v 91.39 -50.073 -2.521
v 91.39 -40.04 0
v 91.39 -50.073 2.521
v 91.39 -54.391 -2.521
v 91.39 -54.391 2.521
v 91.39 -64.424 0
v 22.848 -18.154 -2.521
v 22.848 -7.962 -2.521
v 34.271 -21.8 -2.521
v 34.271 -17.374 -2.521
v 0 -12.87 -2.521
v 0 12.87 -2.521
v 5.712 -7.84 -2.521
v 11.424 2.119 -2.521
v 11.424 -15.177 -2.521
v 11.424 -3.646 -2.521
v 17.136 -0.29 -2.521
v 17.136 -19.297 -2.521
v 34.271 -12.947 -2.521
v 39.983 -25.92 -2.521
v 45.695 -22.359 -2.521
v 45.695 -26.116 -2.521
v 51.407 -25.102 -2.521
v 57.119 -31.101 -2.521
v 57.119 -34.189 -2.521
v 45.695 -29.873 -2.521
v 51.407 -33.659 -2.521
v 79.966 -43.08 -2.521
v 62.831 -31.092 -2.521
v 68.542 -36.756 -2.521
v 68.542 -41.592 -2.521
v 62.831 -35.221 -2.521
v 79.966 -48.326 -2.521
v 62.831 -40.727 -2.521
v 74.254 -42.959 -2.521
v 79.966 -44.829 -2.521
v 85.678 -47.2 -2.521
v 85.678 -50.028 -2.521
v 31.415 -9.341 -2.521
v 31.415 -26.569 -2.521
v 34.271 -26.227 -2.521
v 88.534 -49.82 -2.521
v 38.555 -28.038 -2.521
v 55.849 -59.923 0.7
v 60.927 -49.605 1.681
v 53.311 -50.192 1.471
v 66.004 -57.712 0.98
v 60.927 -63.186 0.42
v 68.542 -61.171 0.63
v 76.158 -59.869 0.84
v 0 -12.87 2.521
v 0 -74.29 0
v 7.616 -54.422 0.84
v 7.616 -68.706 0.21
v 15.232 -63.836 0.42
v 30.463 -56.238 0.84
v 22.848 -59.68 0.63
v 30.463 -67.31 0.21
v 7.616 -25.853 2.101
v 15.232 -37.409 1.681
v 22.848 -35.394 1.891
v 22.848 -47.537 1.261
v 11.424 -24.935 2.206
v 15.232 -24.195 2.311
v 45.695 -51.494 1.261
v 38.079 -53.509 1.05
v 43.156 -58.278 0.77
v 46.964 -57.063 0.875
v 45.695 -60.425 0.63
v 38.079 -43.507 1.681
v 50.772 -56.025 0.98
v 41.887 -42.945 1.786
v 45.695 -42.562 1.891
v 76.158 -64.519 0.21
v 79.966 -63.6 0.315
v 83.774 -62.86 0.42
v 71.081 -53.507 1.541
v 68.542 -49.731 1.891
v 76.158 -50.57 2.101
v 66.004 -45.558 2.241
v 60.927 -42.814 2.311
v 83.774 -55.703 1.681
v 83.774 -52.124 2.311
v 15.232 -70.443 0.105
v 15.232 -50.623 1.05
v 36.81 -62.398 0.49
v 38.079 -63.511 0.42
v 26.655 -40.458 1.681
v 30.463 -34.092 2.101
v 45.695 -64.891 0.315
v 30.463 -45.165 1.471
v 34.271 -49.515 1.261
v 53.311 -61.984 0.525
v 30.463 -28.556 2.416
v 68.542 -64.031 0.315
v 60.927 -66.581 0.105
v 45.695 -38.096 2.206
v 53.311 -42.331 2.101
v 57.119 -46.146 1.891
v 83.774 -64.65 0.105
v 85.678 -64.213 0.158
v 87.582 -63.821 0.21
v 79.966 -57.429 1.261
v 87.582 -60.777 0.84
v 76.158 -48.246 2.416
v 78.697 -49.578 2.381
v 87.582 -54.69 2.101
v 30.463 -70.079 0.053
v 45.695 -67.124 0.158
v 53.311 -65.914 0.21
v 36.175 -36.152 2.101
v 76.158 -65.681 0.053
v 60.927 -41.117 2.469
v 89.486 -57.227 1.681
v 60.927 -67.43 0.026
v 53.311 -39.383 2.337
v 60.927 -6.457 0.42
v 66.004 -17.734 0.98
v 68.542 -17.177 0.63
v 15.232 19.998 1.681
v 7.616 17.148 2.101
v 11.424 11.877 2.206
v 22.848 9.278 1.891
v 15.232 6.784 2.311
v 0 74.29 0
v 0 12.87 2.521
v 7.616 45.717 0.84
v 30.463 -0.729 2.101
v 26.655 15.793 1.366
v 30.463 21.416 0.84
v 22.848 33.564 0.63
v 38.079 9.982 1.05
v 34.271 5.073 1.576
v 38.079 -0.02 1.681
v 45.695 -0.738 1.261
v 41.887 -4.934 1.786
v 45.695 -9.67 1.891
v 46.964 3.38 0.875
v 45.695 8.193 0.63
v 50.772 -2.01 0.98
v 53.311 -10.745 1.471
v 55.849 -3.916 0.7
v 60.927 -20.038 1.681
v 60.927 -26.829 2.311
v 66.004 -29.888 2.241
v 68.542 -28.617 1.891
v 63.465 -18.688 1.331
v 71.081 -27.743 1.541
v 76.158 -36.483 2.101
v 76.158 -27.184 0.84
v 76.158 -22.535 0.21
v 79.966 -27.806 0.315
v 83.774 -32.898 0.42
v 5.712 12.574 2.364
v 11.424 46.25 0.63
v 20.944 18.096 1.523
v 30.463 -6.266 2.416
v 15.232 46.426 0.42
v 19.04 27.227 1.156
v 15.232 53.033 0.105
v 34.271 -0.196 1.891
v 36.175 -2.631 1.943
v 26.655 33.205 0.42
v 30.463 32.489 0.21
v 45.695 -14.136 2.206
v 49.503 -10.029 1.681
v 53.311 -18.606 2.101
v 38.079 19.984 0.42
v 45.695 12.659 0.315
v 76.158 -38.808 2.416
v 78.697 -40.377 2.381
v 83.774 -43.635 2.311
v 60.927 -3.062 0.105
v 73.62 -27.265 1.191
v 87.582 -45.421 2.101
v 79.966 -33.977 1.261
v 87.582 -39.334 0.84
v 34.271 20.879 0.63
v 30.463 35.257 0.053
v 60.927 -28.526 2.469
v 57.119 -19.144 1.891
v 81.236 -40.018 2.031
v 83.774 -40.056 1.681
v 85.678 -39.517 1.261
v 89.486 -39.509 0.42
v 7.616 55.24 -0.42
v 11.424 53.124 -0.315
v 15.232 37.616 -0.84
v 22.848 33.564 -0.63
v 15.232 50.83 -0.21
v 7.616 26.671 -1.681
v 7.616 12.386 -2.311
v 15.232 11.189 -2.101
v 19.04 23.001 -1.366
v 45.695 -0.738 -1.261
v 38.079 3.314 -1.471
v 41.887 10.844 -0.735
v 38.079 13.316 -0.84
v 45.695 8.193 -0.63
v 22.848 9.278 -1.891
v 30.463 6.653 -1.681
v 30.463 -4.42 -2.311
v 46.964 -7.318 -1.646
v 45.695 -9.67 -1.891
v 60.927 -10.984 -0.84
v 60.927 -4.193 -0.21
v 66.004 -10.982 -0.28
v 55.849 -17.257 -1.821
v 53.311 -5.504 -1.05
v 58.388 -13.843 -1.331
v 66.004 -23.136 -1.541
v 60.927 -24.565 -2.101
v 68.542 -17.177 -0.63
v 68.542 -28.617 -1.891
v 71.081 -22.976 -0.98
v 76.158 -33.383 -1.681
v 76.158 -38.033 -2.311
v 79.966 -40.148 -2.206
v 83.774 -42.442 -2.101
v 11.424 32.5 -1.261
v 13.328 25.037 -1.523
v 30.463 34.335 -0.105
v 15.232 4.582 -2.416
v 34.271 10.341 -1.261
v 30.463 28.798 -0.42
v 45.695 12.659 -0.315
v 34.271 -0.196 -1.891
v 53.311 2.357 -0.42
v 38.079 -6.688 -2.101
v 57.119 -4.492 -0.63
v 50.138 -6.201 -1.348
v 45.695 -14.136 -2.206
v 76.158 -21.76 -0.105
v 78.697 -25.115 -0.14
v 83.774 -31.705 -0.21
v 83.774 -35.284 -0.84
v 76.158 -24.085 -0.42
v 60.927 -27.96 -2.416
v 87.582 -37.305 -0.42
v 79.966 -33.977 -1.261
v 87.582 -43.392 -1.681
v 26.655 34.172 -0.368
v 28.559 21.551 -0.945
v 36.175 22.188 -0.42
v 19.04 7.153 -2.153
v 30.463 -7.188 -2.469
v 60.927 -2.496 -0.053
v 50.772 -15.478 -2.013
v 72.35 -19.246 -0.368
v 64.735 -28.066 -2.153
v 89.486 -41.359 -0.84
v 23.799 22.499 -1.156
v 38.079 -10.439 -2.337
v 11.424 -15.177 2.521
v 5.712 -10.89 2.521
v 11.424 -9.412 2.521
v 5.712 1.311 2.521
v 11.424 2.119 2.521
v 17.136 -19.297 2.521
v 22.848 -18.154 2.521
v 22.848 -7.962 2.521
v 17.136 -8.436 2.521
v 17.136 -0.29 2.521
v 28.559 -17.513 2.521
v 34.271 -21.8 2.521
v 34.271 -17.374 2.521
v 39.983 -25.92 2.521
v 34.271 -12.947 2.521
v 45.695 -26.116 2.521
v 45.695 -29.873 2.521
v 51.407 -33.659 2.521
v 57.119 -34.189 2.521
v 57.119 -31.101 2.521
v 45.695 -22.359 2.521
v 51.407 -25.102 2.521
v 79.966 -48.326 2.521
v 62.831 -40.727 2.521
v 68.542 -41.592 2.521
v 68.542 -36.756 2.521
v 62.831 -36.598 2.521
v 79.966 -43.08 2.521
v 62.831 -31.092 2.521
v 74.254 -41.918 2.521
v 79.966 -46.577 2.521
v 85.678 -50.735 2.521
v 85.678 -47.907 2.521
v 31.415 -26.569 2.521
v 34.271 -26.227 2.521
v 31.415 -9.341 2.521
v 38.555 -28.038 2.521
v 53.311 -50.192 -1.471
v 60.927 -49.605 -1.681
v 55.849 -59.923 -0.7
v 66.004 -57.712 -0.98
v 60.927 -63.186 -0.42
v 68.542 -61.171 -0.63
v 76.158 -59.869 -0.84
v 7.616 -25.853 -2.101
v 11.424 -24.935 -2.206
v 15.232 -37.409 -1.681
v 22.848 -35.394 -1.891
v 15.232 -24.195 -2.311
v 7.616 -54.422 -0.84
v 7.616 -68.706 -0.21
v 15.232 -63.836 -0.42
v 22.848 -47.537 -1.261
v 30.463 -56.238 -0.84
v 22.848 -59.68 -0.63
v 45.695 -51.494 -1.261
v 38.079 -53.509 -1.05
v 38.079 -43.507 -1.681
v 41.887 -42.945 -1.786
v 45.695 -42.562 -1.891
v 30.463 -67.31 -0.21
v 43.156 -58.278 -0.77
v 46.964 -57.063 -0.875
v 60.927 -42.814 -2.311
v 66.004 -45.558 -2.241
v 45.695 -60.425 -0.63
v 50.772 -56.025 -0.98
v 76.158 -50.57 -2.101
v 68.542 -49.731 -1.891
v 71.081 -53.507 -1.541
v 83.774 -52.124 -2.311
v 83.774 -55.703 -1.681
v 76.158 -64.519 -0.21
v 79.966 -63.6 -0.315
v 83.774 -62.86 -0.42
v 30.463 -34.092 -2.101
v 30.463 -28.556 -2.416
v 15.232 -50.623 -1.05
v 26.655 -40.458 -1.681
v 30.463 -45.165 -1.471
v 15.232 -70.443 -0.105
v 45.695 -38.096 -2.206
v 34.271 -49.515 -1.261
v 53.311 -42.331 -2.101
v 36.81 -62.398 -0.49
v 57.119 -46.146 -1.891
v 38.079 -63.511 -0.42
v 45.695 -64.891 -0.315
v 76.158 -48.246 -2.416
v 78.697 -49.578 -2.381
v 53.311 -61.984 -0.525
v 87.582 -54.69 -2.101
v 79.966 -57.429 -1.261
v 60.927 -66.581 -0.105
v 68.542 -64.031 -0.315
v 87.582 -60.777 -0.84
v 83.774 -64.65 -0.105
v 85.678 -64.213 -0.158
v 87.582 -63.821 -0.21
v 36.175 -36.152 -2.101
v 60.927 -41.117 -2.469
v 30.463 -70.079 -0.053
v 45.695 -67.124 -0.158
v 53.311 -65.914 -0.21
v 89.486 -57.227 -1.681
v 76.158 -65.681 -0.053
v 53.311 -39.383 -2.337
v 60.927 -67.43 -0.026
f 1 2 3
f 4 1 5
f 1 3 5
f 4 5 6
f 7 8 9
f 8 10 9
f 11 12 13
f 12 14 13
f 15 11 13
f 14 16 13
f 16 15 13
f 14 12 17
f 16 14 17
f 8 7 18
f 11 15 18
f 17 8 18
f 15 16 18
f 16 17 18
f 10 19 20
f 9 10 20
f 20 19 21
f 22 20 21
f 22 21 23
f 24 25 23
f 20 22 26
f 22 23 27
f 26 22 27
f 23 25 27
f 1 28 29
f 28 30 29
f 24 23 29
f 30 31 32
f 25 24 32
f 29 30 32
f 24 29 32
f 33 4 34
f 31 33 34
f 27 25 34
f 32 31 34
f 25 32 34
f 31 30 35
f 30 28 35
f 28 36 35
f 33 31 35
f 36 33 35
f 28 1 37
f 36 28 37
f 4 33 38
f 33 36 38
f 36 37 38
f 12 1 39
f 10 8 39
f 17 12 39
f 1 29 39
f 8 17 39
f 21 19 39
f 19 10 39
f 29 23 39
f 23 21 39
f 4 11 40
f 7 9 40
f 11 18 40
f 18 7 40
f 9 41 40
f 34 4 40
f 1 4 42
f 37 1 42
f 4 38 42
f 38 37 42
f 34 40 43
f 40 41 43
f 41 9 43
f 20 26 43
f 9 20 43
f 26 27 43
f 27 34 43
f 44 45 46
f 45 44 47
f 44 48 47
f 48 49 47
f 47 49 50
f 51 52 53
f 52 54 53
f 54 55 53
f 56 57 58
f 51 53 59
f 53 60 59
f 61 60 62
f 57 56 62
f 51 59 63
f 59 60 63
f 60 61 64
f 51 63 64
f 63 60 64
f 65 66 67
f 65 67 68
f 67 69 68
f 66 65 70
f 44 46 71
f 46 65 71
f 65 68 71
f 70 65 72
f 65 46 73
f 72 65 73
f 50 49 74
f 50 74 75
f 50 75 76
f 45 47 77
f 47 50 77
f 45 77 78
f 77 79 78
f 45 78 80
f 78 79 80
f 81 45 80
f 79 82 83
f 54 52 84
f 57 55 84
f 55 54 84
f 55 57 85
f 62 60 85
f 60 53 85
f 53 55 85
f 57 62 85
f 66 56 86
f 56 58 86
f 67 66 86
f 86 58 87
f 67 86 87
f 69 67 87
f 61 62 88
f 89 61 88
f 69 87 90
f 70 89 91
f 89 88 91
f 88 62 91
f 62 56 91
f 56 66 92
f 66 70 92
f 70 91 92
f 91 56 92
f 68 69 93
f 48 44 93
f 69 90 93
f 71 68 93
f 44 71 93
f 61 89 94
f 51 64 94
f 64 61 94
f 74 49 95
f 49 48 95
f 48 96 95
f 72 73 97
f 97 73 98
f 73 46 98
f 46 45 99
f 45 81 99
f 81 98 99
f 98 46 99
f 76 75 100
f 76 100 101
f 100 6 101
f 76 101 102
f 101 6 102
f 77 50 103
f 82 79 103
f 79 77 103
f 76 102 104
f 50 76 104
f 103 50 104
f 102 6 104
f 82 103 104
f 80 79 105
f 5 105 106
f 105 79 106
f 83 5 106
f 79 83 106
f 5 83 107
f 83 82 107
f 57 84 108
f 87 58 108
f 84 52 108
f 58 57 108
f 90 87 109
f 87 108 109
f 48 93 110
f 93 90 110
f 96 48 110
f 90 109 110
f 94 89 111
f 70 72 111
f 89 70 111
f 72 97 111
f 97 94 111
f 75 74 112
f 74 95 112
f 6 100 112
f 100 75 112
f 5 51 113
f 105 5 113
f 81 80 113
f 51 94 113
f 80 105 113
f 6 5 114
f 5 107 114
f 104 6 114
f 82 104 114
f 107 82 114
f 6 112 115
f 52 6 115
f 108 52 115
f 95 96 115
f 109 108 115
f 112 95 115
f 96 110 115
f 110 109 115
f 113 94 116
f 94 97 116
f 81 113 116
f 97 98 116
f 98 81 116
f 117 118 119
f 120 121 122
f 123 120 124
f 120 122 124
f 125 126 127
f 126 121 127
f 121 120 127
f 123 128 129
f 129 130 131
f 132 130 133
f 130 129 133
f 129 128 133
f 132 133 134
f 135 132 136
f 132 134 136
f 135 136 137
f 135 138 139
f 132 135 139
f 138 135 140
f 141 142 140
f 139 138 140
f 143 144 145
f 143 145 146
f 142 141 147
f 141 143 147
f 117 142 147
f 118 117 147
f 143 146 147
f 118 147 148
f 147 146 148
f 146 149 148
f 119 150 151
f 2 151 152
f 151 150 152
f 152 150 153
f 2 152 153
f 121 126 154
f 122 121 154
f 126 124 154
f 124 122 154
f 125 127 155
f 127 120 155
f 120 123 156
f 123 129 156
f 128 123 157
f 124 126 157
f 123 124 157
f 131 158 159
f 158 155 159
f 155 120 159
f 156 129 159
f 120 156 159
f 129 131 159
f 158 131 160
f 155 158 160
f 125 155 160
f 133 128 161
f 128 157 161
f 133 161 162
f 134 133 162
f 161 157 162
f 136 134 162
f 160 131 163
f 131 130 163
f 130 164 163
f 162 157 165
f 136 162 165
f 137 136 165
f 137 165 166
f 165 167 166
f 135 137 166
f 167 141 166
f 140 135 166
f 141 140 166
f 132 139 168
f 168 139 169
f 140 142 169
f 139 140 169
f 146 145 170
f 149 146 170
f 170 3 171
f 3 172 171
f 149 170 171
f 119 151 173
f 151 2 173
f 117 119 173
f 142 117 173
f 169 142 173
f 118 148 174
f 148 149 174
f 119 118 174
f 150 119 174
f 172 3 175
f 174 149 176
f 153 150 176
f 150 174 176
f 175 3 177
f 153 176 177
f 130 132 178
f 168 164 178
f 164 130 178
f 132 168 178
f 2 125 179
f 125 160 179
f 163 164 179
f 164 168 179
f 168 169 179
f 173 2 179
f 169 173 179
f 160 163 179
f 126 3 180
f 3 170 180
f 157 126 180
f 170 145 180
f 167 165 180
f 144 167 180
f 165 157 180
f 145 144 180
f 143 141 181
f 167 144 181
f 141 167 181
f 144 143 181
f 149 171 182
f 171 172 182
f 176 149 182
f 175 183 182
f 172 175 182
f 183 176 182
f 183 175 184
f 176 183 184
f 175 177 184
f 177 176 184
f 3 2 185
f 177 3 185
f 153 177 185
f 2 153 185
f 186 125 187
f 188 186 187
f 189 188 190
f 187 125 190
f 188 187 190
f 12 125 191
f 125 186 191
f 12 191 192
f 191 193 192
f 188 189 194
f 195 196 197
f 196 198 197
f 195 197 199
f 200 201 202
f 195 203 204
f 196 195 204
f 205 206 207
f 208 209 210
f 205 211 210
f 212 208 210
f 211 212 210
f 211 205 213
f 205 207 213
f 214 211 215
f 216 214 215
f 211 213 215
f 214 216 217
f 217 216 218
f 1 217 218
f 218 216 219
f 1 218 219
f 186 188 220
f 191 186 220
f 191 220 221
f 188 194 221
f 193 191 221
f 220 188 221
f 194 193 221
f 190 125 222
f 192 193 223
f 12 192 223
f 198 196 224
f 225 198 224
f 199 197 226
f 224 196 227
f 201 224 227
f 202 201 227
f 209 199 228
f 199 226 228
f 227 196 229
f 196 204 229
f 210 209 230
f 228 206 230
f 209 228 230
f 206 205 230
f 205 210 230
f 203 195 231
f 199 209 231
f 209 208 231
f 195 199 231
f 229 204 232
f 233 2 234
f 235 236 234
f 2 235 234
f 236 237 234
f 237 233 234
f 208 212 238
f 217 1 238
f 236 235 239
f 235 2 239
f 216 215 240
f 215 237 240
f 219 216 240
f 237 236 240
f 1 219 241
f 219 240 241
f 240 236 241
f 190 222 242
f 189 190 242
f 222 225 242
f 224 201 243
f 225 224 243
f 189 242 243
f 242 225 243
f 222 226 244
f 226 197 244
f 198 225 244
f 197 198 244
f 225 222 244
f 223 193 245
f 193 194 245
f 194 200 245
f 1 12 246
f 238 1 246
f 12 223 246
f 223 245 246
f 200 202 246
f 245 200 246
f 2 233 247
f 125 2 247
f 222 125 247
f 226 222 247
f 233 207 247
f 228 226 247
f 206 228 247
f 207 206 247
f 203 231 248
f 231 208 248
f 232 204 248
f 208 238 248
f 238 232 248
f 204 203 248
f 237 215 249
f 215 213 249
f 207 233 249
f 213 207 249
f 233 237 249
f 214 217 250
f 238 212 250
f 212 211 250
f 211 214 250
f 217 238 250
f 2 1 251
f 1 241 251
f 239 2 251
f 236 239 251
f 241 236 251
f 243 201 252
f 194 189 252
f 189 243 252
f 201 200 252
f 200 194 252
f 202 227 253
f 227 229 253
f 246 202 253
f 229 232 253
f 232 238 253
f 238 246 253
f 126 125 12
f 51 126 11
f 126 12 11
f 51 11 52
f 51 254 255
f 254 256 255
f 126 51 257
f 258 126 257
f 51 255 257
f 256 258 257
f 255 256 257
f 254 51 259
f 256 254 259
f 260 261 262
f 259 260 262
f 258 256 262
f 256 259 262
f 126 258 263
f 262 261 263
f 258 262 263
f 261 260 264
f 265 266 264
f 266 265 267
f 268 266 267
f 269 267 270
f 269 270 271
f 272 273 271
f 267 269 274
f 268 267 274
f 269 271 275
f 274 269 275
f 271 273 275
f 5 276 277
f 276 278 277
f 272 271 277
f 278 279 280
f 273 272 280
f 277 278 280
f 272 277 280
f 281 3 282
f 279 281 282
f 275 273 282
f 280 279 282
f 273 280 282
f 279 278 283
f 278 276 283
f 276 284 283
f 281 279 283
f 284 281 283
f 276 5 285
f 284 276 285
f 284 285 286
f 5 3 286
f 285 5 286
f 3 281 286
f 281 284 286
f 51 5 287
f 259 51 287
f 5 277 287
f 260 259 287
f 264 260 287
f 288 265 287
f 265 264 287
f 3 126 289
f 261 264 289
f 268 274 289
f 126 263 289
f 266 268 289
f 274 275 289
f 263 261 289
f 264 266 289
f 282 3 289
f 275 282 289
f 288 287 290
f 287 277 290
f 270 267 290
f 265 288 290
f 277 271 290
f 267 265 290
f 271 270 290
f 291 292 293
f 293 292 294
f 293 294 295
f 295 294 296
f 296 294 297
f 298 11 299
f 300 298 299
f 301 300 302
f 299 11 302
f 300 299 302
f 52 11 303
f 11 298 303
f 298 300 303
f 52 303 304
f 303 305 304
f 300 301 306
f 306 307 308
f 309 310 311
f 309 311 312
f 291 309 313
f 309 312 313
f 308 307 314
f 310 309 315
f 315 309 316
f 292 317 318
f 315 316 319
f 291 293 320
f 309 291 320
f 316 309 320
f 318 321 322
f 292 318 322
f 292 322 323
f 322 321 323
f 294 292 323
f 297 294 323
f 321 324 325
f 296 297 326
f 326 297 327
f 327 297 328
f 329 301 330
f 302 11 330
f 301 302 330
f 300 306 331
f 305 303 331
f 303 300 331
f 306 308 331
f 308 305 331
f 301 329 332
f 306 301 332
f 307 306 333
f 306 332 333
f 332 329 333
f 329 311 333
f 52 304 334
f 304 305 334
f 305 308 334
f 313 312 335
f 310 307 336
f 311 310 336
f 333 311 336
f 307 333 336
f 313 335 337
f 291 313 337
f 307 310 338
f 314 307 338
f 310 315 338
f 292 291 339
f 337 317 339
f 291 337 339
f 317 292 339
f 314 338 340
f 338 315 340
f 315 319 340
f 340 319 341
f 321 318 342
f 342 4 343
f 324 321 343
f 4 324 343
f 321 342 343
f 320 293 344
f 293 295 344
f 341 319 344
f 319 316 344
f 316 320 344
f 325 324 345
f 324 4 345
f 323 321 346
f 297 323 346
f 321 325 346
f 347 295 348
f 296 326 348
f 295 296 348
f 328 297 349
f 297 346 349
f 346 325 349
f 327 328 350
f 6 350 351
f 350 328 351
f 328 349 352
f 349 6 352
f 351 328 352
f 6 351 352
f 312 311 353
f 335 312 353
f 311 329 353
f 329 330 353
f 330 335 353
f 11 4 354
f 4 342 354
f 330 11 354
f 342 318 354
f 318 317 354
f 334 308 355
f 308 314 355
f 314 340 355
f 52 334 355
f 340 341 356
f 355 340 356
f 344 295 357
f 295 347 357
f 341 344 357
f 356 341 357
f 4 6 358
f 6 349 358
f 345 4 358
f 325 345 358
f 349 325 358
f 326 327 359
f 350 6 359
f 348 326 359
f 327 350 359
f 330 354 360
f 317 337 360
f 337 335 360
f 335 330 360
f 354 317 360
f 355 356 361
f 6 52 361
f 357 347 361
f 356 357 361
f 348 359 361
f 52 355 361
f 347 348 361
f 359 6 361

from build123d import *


with BuildPart() as part:
    # Sketch1 → Loft1 section 0
    with BuildSketch(Plane(origin=(0, 0, 0), x_dir=(0, 0, -1), z_dir=(1, 0, 0))):
        Polygon((0, 74.29), (2.521153846, 12.87), (2.521153846, -12.87), (0, -74.29), (-2.521153846, -12.87), (-2.521153846, 12.87), align=None)
    # Sketch2 → Loft1 section 1
    with BuildSketch(Plane(origin=(91.39, 0, 0), x_dir=(0, 0, -1), z_dir=(1, 0, 0))):
        Polygon((0, -64.424), (2.521153846, -54.391), (2.521153846, -50.073), (0, -40.04), (-2.521153846, -50.073), (-2.521153846, -54.391), align=None)
    loft()


solid = part.part
